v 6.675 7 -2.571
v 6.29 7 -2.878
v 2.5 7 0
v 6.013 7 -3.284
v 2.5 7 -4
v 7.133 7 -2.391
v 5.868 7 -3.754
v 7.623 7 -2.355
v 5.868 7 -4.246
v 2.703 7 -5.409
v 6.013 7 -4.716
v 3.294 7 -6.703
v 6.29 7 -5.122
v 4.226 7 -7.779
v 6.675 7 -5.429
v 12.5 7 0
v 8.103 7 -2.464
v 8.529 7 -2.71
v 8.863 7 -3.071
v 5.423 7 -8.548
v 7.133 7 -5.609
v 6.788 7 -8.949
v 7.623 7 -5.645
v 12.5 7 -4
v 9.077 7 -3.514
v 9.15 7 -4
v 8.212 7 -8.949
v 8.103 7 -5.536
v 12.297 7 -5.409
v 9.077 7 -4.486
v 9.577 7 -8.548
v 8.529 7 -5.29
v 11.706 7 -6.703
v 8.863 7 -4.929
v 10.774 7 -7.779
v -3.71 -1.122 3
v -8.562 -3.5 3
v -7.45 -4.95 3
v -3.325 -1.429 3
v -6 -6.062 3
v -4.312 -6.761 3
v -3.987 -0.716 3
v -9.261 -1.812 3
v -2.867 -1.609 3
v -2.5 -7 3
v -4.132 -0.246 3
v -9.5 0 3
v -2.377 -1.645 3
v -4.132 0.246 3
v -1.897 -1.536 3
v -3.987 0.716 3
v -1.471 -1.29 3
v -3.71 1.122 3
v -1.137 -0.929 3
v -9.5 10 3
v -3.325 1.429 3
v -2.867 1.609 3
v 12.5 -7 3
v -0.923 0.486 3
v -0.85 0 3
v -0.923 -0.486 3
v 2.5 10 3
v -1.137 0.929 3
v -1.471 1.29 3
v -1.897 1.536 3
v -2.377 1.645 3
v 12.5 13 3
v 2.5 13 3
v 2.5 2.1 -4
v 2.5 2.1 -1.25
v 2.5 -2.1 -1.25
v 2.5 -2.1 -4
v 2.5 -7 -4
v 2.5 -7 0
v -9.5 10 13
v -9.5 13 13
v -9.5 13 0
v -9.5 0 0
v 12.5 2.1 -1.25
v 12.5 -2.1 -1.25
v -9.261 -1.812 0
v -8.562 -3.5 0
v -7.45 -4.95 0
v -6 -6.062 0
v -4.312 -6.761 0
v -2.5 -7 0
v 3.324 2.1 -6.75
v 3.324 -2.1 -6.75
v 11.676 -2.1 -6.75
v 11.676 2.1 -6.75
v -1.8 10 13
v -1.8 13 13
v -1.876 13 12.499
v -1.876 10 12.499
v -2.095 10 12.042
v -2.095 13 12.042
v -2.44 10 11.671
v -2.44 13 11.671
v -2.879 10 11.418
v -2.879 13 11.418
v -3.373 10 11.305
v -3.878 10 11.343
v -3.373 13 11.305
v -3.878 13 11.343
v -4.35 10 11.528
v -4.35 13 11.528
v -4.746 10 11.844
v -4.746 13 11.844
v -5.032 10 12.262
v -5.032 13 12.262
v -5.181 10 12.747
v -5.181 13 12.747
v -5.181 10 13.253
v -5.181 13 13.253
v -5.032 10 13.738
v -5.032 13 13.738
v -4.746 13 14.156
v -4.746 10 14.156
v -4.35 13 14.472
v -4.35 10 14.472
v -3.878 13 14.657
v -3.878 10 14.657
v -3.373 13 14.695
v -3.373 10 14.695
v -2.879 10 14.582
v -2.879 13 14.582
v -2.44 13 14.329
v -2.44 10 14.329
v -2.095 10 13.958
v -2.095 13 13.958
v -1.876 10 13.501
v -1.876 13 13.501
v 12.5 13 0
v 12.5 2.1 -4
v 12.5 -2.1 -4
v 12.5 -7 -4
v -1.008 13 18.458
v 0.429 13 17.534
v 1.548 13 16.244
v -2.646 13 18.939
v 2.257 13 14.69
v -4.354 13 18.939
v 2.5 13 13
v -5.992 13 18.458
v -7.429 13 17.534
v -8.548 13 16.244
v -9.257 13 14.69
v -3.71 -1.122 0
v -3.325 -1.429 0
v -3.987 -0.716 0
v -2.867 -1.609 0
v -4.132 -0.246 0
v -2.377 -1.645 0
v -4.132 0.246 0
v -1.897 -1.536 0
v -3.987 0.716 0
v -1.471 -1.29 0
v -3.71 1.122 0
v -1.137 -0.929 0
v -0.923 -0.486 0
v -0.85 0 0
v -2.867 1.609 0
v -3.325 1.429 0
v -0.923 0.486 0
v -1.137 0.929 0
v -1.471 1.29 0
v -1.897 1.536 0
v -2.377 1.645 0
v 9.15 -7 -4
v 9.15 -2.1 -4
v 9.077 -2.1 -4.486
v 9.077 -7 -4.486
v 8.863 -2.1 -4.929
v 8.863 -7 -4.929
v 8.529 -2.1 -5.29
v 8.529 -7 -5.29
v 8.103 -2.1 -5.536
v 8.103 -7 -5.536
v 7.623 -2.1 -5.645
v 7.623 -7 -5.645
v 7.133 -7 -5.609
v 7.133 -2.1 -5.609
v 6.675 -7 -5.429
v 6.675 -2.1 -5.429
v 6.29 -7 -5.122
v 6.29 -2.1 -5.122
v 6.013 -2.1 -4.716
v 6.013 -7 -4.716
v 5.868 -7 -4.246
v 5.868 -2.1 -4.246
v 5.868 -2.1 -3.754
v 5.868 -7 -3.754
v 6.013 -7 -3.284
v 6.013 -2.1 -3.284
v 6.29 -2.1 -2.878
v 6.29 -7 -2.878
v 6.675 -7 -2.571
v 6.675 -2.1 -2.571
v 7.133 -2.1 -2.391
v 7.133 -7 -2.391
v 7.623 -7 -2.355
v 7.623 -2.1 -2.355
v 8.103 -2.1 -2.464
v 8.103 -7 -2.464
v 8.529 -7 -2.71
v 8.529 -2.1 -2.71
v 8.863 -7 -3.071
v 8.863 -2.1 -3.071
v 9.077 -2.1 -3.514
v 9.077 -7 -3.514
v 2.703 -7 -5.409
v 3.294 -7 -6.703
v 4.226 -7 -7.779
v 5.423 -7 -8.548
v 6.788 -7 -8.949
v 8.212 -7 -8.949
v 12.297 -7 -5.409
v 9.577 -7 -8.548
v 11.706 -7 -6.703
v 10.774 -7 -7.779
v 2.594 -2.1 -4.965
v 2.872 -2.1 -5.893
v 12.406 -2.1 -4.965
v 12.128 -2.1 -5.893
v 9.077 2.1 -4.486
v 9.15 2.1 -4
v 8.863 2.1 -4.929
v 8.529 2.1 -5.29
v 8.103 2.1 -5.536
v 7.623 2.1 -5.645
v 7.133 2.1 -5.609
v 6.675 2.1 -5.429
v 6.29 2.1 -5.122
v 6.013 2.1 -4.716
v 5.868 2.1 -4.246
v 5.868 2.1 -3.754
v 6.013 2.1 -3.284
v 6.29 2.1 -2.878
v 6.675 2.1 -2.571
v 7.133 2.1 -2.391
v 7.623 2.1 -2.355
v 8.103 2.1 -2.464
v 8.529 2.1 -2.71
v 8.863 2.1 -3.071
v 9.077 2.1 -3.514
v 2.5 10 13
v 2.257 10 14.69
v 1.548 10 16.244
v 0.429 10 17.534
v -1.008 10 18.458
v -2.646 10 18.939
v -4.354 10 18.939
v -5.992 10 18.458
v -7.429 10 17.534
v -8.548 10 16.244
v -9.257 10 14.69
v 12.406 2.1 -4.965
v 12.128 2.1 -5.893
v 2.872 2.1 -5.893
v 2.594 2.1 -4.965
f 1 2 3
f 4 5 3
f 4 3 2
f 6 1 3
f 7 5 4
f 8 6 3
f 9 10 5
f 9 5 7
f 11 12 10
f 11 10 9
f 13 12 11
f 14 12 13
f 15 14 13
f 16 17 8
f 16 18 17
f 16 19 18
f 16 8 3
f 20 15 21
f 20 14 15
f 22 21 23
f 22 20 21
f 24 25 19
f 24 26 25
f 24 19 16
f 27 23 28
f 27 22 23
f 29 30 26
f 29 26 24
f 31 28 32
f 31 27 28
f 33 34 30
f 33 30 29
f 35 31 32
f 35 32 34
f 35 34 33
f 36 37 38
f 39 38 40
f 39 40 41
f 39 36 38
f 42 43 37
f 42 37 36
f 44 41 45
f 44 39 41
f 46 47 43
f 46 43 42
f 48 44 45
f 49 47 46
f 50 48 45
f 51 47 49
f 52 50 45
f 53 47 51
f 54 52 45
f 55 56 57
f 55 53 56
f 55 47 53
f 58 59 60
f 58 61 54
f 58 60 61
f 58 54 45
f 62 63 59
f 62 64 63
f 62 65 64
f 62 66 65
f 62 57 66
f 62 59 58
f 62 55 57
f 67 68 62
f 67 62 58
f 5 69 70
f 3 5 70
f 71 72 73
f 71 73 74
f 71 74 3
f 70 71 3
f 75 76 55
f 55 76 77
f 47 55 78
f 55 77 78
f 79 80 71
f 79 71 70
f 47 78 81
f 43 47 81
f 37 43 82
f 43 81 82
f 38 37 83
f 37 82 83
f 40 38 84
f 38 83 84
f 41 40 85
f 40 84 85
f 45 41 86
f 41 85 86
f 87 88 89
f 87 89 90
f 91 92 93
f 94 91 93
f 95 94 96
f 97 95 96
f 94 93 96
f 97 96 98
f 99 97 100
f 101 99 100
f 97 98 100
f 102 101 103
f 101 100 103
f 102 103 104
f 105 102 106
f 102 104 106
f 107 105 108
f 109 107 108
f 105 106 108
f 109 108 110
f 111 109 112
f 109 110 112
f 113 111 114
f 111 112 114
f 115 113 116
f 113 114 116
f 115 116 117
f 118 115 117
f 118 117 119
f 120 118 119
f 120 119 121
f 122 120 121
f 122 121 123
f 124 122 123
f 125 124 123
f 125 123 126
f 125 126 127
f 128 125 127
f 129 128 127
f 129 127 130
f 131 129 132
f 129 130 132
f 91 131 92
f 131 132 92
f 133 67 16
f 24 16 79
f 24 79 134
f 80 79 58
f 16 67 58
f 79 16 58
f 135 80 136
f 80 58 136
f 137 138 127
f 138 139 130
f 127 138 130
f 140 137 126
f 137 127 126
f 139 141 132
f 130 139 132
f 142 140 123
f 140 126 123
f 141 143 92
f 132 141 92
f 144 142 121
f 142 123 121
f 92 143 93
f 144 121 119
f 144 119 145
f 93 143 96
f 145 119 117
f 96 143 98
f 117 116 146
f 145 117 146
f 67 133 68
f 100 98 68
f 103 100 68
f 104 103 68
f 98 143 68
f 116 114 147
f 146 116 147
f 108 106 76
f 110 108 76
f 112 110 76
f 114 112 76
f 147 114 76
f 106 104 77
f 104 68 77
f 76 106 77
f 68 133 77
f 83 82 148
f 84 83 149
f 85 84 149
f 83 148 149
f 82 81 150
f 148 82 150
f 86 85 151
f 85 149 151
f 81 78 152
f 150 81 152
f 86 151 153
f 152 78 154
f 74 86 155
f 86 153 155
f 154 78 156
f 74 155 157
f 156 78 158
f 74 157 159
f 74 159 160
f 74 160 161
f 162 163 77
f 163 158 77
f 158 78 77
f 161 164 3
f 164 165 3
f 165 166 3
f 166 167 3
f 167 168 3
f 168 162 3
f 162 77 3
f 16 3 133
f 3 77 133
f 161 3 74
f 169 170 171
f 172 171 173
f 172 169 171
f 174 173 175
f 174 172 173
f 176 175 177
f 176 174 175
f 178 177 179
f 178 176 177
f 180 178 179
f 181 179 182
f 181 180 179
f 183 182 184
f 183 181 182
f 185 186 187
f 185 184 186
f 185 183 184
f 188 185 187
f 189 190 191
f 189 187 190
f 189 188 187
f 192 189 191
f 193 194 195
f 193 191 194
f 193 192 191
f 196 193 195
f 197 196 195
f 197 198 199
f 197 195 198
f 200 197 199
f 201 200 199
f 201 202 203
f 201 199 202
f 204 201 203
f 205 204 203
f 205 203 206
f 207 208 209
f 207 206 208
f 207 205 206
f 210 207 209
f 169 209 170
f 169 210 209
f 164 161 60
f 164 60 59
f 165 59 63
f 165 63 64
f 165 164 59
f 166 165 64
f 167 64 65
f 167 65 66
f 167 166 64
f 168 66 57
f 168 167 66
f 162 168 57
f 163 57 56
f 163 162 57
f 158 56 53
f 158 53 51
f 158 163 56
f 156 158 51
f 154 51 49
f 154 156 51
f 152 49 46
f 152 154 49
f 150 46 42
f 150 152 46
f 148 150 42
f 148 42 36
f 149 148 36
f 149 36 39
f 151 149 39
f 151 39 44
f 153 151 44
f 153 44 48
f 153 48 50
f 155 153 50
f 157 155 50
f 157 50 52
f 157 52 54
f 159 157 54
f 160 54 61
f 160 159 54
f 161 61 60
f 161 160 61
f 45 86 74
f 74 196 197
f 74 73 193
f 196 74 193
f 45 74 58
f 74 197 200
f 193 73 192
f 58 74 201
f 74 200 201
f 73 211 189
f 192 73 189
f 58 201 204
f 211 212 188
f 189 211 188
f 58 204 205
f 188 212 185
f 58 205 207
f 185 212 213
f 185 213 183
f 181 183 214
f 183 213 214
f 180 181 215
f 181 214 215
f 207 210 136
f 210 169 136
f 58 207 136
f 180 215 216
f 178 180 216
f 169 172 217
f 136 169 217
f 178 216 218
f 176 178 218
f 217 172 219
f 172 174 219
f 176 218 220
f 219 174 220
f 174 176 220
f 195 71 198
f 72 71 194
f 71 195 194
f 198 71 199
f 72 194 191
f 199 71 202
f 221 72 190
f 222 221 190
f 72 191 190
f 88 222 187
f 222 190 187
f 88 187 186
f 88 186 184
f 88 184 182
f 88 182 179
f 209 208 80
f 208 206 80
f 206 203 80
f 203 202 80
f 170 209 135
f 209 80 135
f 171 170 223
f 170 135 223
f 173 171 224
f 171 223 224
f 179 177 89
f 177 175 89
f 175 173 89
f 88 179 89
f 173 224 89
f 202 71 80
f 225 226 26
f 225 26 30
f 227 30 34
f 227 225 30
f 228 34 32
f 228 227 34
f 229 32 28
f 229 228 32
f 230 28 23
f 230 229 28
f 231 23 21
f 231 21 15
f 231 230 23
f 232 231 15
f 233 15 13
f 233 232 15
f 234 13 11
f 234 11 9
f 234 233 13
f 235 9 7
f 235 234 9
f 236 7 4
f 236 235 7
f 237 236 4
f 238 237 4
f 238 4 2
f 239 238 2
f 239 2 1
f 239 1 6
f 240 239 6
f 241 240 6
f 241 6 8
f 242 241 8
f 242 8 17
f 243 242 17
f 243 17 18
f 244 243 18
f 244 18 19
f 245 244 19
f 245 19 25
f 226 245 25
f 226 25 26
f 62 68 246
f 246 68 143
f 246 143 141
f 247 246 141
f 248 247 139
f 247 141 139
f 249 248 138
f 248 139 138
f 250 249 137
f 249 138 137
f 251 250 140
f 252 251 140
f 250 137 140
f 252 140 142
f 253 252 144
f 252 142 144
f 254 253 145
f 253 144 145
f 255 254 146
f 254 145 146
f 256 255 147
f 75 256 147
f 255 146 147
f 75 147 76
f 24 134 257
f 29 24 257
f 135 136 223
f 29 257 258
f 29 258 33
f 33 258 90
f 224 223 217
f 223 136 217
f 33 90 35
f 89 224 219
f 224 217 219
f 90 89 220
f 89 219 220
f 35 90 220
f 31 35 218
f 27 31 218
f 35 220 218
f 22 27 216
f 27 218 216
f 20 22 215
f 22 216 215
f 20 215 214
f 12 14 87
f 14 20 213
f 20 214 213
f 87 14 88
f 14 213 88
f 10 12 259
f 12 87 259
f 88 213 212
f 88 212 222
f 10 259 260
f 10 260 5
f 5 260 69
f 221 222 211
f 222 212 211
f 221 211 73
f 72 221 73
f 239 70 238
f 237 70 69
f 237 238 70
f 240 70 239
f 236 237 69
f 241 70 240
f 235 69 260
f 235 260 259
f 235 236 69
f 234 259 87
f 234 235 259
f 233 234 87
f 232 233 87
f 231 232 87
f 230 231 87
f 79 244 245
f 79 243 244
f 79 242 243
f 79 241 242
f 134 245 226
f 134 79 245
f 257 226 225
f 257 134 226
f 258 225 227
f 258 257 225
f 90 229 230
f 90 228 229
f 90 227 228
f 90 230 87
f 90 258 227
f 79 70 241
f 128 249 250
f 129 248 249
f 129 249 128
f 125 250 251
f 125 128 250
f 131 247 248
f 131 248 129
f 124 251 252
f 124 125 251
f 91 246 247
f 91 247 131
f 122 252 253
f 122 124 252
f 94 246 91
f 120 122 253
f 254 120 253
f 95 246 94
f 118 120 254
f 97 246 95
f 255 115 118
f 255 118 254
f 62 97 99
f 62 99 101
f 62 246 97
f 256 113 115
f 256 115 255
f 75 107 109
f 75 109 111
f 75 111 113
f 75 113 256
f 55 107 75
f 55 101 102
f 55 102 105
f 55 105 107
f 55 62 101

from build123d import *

# Parameters (mm, degrees)
ESBO_O1_R                = 1.65
RESSALTO_EXTRUS_O1_DEPTH = 3
ESBO_O3_R                = 1.65
RESSALTO_EXTRUS_O2_DEPTH = 14
ESBO_O4_W                = 5.5
ESBO_O4_H                = 4.2
CORTE_EXTRUS_O1_DEPTH    = 10
ESBO_O5_R                = 1.7
RESSALTO_EXTRUS_O3_DEPTH = 3


with BuildPart() as part:
    # Esboço1 → Ressalto-extrusão1 (new body)
    with BuildSketch(Plane.XY):
        with BuildLine():
            Line((-2.5, -7), (2.5, -7))
            Line((2.5, -7), (12.5, -7))
            Line((12.5, -7), (12.5, 13))
            Line((12.5, 13), (-9.5, 13))
            Line((-9.5, 13), (-9.5, 0))
            ThreePointArc((-9.5, 0), (-7.449747468, -4.949747468), (-2.5, -7))
        make_face()
        with Locations((-2.5, 0)):
            Circle(ESBO_O1_R, mode=Mode.SUBTRACT)
    extrude(amount=RESSALTO_EXTRUS_O1_DEPTH)

    # Esboço3 → Ressalto-extrusão2 (add)
    with BuildSketch(Plane(origin=(0, -7, 0), x_dir=(1, 0, 0), z_dir=(0, 1, 0))):
        with BuildLine():
            Line((2.5, 4), (2.5, 0))
            Line((2.5, 0), (12.5, 0))
            Line((12.5, 0), (12.5, 4))
            ThreePointArc((12.5, 4), (7.5, 9), (2.5, 4))
        make_face()
        with Locations((7.5, 4)):
            Circle(ESBO_O3_R, mode=Mode.SUBTRACT)
    extrude(amount=RESSALTO_EXTRUS_O2_DEPTH)

    # Esboço4 → Corte-extrusão1 (cut)
    with BuildSketch(Plane(origin=(12.5, 0, 0), x_dir=(0, 0, -1), z_dir=(1, 0, 0))):
        with Locations((4, 0)):
            Rectangle(ESBO_O4_W, ESBO_O4_H)
    extrude(amount=-CORTE_EXTRUS_O1_DEPTH, mode=Mode.SUBTRACT)

    # Esboço5 → Ressalto-extrusão3 (add)
    with BuildSketch(Plane(origin=(0, 13, 0), x_dir=(1, 0, 0), z_dir=(0, 1, 0))):
        with BuildLine():
            Line((2.5, 0), (2.5, -13))
            ThreePointArc((2.5, -13), (-3.5, -19), (-9.5, -13))
            Line((-9.5, -13), (-9.5, 0))
            Line((-9.5, 0), (2.5, 0))
        make_face()
        with Locations((-3.5, -13)):
            Circle(ESBO_O5_R, mode=Mode.SUBTRACT)
    extrude(amount=-RESSALTO_EXTRUS_O3_DEPTH)


solid = part.part
